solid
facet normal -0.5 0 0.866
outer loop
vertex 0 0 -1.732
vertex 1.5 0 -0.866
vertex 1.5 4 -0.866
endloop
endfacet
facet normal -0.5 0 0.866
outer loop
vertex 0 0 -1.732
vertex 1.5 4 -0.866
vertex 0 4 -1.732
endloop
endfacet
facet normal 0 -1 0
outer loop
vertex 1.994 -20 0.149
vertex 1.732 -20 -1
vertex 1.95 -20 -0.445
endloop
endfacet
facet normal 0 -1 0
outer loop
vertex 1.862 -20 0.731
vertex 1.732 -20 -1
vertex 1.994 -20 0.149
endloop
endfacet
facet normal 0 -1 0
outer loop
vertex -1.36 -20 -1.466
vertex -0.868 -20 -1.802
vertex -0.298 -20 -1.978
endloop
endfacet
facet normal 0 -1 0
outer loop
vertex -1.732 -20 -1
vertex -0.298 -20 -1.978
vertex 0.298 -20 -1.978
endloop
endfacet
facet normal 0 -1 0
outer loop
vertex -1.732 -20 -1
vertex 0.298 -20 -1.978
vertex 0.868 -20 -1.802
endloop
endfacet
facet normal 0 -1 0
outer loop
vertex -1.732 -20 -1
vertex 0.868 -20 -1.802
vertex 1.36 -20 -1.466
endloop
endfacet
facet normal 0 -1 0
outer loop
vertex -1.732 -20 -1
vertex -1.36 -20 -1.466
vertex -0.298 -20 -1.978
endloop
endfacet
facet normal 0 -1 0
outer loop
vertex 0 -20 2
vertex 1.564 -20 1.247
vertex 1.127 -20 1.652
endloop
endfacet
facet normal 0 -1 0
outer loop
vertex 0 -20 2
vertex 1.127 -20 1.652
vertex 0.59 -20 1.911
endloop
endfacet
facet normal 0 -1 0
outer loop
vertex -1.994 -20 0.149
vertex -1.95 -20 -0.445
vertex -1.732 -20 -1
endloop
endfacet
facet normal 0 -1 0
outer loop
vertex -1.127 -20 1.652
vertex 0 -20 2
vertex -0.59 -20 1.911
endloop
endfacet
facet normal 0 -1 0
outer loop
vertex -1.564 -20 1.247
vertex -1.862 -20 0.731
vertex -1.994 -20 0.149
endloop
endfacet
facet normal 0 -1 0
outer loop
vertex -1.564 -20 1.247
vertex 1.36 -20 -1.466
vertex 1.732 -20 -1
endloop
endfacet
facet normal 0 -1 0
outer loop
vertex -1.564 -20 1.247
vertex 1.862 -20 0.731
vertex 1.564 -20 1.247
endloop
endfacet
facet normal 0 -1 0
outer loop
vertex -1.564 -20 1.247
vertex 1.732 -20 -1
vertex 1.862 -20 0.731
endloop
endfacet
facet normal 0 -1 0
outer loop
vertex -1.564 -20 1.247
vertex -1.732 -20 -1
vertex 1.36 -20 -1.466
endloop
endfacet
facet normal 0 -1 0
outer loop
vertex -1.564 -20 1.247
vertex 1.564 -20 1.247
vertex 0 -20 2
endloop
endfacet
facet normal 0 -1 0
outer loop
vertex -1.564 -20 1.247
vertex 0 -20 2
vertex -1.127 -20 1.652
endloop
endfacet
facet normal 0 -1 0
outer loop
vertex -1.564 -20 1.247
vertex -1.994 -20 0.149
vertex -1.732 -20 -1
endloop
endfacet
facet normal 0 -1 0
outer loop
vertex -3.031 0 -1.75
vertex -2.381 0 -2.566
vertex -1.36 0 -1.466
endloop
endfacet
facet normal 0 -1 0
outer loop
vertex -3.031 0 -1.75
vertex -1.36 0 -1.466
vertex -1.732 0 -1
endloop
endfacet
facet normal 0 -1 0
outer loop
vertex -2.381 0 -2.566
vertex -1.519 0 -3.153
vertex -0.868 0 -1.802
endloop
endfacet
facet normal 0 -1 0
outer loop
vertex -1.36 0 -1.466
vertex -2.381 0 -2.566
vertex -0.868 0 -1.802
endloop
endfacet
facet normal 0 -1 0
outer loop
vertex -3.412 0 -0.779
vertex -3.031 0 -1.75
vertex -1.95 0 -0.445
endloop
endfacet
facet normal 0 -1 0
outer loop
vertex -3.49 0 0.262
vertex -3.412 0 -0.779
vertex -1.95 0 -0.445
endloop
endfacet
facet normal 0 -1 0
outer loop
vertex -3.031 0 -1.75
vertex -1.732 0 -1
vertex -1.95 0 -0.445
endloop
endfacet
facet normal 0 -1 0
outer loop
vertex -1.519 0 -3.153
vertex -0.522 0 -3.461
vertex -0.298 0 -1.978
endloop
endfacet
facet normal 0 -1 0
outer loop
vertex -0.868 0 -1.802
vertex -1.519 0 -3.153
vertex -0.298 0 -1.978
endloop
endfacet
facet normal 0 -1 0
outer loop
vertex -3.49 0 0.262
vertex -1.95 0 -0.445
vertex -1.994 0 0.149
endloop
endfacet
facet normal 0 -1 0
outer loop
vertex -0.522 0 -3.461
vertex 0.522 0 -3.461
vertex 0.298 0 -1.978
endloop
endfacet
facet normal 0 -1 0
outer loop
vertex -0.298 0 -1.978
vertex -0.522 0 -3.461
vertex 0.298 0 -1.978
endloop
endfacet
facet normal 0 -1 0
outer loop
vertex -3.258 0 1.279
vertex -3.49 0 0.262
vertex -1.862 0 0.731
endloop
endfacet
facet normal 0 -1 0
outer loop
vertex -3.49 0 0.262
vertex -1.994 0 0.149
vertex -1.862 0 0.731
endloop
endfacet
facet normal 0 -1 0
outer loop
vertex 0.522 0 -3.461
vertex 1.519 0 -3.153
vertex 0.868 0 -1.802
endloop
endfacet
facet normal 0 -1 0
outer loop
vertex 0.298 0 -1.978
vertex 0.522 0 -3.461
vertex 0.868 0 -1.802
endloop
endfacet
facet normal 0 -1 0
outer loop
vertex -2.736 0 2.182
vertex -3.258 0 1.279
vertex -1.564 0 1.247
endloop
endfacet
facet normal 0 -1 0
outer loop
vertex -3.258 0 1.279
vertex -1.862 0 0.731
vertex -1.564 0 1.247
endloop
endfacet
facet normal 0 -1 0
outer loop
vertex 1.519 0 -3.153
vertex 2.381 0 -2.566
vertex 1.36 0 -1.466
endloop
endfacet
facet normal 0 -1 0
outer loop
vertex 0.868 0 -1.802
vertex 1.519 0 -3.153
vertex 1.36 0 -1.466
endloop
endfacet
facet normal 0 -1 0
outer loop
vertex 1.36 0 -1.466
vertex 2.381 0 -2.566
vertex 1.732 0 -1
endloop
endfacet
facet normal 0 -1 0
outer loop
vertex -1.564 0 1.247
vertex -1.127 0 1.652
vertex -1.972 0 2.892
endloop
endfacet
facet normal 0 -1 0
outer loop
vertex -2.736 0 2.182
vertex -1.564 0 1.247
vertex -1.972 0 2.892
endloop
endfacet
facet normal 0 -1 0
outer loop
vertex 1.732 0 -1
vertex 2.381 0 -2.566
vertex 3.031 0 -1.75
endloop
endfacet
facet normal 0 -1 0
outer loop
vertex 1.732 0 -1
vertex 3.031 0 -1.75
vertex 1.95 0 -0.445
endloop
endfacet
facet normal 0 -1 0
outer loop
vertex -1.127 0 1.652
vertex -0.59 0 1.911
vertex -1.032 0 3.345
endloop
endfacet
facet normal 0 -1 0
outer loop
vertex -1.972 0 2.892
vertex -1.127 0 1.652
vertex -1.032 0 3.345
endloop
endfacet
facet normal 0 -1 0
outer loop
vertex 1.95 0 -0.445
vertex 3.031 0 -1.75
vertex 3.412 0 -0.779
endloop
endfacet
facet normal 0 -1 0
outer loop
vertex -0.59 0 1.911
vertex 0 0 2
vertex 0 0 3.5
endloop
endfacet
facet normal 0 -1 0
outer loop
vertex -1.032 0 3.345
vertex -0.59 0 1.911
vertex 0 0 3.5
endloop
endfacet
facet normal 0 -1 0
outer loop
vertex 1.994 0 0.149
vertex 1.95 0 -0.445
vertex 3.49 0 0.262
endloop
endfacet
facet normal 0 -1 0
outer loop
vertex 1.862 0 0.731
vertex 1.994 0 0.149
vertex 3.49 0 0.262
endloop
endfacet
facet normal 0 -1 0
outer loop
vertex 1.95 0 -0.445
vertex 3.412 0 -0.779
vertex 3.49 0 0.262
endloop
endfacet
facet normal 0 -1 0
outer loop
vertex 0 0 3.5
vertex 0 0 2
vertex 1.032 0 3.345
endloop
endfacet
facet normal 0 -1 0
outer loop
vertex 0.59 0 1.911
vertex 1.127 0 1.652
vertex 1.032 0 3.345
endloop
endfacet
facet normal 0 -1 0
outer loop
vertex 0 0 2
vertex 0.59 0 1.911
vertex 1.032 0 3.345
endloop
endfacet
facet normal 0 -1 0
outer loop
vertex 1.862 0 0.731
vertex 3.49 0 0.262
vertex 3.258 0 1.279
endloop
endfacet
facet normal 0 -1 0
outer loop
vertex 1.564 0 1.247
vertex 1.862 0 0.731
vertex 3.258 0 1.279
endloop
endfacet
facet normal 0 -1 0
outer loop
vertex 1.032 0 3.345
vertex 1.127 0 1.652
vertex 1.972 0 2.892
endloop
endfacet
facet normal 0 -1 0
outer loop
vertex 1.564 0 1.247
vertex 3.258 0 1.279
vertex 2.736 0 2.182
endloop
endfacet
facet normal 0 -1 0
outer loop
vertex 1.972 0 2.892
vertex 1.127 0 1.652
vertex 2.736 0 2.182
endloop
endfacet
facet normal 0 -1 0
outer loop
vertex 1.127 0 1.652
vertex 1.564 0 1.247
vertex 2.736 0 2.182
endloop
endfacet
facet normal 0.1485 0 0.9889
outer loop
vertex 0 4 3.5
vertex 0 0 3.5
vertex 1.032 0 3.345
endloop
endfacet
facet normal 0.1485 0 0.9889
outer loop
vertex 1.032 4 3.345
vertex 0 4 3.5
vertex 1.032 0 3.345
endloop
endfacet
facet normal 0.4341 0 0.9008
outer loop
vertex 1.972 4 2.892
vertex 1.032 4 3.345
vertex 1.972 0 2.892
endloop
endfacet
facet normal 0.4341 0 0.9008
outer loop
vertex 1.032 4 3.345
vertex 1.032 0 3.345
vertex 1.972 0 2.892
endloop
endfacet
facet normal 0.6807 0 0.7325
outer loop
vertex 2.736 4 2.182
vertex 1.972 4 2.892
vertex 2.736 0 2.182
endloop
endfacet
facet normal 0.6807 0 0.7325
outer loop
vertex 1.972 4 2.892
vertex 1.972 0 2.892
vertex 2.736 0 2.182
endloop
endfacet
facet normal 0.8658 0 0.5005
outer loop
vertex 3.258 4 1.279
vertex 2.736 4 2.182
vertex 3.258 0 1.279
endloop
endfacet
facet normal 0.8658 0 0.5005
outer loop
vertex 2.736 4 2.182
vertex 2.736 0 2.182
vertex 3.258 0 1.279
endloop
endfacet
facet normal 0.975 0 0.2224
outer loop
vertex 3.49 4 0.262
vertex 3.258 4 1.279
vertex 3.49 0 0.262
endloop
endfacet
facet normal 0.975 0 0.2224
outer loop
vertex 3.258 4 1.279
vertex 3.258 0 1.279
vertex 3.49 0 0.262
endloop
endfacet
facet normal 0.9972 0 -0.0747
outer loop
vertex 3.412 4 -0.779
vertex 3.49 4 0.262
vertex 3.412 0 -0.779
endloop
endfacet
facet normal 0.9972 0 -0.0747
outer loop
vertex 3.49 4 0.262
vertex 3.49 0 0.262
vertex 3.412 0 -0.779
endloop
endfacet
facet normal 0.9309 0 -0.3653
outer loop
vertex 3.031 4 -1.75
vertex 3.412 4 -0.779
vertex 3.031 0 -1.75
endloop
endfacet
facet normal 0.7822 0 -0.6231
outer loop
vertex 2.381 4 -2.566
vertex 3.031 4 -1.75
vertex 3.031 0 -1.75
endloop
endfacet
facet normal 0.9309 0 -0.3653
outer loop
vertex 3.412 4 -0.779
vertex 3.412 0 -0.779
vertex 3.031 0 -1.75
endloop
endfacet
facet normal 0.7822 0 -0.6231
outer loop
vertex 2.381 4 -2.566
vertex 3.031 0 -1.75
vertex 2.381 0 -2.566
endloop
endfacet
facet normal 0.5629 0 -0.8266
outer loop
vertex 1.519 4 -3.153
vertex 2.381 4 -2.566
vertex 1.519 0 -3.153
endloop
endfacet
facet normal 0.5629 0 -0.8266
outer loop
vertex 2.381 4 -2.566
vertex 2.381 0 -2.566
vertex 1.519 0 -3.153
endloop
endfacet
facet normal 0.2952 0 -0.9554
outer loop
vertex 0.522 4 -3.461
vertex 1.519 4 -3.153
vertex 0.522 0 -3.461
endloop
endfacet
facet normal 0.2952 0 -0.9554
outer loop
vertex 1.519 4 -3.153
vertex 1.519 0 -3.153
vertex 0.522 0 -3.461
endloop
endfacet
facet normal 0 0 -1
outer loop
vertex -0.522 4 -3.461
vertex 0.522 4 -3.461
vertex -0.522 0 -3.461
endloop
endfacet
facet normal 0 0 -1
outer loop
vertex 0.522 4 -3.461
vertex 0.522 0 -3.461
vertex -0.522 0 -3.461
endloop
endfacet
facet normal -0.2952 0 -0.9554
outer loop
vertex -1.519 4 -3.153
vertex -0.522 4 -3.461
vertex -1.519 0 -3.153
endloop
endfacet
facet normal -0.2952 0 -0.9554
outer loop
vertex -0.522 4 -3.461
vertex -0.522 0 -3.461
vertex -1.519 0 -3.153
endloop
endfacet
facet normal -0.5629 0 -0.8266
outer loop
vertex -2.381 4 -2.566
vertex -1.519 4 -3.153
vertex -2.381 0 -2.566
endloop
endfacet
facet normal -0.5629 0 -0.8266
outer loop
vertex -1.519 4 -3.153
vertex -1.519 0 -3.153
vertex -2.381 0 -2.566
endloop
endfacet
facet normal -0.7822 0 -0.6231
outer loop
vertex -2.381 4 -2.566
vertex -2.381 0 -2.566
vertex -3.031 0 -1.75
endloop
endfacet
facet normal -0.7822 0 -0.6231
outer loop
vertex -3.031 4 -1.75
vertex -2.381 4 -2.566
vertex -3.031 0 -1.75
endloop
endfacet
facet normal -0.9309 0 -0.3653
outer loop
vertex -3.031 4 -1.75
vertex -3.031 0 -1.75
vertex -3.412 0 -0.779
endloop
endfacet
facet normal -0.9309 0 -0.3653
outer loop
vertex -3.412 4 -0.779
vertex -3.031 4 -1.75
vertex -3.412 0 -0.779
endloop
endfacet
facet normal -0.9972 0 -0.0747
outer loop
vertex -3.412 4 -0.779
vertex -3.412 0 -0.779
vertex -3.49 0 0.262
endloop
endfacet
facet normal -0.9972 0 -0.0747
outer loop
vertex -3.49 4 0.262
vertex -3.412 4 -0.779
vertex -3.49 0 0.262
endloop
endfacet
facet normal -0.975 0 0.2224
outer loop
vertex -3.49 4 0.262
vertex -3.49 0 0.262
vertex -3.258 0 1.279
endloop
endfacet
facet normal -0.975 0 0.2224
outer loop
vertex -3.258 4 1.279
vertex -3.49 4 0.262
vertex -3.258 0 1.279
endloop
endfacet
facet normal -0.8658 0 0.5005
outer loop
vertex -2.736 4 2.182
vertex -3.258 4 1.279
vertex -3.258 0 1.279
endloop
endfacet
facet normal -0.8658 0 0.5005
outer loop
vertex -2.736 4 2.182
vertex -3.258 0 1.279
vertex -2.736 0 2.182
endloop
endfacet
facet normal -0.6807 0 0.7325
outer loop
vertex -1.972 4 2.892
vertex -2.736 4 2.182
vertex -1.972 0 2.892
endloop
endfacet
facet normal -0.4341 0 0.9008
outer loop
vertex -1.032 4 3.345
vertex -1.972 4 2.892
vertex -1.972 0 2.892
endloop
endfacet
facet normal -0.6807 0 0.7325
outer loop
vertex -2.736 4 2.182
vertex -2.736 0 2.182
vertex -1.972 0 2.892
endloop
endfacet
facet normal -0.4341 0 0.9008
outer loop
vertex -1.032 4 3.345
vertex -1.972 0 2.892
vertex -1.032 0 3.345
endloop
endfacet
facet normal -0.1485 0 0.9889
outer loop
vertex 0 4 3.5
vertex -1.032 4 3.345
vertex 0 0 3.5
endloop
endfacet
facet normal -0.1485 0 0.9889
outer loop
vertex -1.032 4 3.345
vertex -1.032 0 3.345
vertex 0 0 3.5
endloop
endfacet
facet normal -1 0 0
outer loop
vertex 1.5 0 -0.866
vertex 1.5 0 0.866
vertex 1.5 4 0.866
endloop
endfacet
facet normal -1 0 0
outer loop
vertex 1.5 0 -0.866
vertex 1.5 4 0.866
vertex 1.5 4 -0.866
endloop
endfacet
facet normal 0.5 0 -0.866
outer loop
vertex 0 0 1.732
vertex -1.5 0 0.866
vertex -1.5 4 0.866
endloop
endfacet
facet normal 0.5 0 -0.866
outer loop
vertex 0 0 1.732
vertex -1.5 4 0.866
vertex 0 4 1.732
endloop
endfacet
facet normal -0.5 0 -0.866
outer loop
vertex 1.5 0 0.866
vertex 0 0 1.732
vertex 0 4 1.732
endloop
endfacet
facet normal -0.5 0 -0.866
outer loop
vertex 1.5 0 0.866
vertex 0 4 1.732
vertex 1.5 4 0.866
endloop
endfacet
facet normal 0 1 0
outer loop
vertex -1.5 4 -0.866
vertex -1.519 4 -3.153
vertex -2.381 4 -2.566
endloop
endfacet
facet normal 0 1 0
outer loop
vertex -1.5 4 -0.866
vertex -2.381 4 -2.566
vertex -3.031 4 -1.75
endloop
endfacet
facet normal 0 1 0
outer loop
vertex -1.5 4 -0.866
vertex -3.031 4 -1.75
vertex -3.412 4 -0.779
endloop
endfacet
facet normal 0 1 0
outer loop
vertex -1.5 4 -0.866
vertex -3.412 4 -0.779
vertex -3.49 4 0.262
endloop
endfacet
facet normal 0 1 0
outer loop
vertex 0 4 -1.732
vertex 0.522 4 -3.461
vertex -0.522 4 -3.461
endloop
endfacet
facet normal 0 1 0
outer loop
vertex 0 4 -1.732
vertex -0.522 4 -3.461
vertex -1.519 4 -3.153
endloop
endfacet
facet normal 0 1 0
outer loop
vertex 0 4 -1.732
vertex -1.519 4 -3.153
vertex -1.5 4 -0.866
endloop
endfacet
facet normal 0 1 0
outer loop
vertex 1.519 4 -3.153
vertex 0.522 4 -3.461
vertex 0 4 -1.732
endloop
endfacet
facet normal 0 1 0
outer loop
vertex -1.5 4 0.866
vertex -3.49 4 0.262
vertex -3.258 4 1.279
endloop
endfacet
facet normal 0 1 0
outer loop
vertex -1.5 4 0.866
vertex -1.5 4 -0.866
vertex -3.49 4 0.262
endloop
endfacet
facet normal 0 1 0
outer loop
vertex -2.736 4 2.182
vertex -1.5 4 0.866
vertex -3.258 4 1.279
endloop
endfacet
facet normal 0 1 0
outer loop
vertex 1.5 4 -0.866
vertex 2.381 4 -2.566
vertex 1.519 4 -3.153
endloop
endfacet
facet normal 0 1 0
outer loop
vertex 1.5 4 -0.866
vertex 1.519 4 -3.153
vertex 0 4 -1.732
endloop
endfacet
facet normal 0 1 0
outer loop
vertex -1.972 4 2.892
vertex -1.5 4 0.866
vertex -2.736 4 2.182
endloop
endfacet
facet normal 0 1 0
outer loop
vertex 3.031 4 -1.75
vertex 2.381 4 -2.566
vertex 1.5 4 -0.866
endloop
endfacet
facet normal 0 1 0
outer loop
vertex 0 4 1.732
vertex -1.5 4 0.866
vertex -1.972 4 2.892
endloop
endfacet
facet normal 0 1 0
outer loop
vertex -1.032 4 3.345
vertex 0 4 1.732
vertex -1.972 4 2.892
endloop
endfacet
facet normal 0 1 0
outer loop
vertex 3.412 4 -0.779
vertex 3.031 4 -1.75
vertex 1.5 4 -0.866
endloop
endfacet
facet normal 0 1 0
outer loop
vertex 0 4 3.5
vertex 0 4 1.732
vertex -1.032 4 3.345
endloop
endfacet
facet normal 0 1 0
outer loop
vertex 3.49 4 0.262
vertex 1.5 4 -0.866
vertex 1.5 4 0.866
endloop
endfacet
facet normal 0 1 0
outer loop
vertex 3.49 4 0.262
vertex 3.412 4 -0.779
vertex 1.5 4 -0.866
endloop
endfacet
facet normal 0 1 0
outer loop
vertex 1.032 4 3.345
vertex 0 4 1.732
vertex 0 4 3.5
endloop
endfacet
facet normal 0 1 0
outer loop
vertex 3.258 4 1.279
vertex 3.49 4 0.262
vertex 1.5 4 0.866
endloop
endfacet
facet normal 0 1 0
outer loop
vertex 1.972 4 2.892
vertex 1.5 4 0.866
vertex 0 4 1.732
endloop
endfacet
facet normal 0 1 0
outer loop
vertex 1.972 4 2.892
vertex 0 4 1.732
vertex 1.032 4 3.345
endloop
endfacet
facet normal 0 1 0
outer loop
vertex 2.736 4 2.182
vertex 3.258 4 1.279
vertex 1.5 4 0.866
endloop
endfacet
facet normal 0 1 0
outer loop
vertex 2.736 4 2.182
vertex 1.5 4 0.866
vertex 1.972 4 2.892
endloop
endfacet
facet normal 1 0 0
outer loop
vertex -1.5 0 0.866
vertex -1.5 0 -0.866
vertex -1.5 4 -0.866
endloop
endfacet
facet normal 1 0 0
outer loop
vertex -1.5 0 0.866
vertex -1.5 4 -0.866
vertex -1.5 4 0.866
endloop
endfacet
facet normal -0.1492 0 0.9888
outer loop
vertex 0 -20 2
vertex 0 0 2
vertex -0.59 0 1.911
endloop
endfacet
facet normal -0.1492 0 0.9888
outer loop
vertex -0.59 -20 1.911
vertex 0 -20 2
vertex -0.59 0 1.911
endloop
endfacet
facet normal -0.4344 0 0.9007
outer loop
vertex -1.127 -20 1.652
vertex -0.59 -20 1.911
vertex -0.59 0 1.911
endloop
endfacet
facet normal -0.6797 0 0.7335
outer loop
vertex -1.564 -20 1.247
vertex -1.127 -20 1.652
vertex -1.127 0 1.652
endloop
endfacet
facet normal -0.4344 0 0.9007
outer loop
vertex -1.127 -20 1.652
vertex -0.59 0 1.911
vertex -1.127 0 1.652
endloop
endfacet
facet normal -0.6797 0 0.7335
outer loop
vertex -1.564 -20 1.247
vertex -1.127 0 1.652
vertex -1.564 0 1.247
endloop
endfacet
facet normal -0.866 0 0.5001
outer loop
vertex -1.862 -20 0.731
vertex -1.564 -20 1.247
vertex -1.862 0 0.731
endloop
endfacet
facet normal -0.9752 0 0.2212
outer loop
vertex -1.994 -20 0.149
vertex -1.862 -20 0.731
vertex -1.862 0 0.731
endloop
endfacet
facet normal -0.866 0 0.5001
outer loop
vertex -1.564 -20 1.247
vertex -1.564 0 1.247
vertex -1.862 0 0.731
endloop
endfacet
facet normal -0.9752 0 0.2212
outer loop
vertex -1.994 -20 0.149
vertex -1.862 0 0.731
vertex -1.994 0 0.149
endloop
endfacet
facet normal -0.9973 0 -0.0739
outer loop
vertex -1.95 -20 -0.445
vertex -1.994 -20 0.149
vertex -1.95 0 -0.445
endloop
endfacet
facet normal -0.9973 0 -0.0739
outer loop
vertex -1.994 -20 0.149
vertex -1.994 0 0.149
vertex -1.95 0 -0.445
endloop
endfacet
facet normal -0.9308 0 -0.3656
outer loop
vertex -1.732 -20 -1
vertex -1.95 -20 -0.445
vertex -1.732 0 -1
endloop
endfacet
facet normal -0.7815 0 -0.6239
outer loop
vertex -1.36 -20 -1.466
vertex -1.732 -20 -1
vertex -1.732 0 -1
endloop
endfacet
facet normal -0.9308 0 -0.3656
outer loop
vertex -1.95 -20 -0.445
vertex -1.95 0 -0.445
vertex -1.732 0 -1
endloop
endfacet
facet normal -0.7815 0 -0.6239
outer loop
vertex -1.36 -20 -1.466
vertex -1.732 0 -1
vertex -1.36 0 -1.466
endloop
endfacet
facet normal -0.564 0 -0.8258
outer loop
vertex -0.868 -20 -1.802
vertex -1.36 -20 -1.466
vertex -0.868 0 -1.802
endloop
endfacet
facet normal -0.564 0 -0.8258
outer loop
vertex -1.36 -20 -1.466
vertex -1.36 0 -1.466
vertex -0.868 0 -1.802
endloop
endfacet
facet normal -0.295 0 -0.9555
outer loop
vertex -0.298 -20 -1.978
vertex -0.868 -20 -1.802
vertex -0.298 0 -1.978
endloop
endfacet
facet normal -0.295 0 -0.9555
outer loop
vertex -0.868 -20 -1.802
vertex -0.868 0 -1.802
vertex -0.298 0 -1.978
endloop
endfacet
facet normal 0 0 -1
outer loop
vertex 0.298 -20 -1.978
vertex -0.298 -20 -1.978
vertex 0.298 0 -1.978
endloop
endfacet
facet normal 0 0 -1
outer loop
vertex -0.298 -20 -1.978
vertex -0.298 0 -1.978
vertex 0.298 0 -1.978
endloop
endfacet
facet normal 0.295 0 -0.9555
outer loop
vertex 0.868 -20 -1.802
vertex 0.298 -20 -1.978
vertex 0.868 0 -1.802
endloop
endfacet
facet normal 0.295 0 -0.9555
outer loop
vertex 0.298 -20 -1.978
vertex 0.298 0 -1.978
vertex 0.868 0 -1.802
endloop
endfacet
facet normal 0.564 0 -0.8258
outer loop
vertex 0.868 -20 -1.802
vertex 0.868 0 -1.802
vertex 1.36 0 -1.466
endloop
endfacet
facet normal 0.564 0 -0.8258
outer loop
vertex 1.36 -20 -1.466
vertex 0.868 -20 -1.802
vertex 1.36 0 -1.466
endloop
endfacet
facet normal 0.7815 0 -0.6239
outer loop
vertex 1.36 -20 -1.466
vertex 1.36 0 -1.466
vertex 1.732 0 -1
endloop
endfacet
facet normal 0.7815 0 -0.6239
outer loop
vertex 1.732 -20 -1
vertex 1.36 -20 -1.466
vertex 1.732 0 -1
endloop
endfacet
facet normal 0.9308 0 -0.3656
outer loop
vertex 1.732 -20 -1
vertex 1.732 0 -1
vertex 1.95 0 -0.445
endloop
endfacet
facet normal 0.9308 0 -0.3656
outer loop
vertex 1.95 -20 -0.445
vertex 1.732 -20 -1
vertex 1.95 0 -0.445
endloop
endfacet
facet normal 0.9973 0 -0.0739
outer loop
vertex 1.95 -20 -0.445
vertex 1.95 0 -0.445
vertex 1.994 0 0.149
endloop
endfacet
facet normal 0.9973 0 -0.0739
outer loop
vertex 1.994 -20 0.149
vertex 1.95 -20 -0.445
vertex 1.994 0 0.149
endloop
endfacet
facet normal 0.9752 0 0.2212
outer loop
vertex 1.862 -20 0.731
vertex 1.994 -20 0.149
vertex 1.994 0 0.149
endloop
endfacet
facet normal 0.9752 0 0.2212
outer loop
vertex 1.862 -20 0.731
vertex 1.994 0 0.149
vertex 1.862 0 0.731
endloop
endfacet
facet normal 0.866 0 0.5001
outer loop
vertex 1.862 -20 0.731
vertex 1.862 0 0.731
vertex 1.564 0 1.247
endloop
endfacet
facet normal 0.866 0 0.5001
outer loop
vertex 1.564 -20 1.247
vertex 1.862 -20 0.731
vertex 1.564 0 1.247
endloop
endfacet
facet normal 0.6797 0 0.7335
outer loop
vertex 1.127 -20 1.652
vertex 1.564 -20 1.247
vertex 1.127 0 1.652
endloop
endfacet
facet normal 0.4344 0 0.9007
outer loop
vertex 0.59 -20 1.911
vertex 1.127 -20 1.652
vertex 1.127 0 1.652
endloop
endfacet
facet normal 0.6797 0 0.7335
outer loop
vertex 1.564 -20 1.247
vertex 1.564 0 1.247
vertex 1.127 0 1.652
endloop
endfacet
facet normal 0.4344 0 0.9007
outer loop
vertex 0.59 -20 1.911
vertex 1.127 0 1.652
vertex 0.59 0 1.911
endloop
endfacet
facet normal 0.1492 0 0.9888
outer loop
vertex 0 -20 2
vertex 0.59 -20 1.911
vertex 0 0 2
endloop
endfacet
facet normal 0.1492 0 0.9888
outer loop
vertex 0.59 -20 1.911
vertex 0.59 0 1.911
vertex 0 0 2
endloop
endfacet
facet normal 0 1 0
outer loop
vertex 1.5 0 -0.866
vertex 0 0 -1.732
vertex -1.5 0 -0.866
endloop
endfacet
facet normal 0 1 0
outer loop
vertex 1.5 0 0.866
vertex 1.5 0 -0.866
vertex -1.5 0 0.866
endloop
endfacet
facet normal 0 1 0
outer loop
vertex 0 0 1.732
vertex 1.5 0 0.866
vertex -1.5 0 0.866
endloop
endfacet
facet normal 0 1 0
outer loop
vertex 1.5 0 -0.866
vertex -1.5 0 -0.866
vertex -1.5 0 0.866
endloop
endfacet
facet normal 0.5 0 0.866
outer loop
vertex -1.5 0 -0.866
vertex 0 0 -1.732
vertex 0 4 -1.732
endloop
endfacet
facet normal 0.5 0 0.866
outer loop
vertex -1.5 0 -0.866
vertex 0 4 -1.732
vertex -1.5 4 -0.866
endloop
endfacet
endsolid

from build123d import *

# Parameters (mm, degrees)
SKETCH2_R           = 3.5
BOSS_EXTRUDE1_DEPTH = 4
SKETCH3_R           = 2
BOSS_EXTRUDE2_DEPTH = 20


with BuildPart() as part:
    # Sketch2 → Boss-Extrude1 (new body)
    with BuildSketch(Plane(origin=(0, 0, 0), x_dir=(1, 0, 0), z_dir=(0, 1, 0))):
        with Locations(Location((0, 0, 0), (0, 0, 270))):
            Circle(SKETCH2_R)
        Polygon((0, 1.732050808), (-1.5, 0.866025404), (-1.5, -0.866025404), (0, -1.732050808), (1.5, -0.866025404), (1.5, 0.866025404), align=None, mode=Mode.SUBTRACT)
    extrude(amount=BOSS_EXTRUDE1_DEPTH)

    # Sketch3 → Boss-Extrude2 (add)
    with BuildSketch(Plane.XZ):
        with Locations(Location((0, 0, 0), (0, 0, 90))):
            Circle(SKETCH3_R)
    extrude(amount=BOSS_EXTRUDE2_DEPTH)


solid = part.part
